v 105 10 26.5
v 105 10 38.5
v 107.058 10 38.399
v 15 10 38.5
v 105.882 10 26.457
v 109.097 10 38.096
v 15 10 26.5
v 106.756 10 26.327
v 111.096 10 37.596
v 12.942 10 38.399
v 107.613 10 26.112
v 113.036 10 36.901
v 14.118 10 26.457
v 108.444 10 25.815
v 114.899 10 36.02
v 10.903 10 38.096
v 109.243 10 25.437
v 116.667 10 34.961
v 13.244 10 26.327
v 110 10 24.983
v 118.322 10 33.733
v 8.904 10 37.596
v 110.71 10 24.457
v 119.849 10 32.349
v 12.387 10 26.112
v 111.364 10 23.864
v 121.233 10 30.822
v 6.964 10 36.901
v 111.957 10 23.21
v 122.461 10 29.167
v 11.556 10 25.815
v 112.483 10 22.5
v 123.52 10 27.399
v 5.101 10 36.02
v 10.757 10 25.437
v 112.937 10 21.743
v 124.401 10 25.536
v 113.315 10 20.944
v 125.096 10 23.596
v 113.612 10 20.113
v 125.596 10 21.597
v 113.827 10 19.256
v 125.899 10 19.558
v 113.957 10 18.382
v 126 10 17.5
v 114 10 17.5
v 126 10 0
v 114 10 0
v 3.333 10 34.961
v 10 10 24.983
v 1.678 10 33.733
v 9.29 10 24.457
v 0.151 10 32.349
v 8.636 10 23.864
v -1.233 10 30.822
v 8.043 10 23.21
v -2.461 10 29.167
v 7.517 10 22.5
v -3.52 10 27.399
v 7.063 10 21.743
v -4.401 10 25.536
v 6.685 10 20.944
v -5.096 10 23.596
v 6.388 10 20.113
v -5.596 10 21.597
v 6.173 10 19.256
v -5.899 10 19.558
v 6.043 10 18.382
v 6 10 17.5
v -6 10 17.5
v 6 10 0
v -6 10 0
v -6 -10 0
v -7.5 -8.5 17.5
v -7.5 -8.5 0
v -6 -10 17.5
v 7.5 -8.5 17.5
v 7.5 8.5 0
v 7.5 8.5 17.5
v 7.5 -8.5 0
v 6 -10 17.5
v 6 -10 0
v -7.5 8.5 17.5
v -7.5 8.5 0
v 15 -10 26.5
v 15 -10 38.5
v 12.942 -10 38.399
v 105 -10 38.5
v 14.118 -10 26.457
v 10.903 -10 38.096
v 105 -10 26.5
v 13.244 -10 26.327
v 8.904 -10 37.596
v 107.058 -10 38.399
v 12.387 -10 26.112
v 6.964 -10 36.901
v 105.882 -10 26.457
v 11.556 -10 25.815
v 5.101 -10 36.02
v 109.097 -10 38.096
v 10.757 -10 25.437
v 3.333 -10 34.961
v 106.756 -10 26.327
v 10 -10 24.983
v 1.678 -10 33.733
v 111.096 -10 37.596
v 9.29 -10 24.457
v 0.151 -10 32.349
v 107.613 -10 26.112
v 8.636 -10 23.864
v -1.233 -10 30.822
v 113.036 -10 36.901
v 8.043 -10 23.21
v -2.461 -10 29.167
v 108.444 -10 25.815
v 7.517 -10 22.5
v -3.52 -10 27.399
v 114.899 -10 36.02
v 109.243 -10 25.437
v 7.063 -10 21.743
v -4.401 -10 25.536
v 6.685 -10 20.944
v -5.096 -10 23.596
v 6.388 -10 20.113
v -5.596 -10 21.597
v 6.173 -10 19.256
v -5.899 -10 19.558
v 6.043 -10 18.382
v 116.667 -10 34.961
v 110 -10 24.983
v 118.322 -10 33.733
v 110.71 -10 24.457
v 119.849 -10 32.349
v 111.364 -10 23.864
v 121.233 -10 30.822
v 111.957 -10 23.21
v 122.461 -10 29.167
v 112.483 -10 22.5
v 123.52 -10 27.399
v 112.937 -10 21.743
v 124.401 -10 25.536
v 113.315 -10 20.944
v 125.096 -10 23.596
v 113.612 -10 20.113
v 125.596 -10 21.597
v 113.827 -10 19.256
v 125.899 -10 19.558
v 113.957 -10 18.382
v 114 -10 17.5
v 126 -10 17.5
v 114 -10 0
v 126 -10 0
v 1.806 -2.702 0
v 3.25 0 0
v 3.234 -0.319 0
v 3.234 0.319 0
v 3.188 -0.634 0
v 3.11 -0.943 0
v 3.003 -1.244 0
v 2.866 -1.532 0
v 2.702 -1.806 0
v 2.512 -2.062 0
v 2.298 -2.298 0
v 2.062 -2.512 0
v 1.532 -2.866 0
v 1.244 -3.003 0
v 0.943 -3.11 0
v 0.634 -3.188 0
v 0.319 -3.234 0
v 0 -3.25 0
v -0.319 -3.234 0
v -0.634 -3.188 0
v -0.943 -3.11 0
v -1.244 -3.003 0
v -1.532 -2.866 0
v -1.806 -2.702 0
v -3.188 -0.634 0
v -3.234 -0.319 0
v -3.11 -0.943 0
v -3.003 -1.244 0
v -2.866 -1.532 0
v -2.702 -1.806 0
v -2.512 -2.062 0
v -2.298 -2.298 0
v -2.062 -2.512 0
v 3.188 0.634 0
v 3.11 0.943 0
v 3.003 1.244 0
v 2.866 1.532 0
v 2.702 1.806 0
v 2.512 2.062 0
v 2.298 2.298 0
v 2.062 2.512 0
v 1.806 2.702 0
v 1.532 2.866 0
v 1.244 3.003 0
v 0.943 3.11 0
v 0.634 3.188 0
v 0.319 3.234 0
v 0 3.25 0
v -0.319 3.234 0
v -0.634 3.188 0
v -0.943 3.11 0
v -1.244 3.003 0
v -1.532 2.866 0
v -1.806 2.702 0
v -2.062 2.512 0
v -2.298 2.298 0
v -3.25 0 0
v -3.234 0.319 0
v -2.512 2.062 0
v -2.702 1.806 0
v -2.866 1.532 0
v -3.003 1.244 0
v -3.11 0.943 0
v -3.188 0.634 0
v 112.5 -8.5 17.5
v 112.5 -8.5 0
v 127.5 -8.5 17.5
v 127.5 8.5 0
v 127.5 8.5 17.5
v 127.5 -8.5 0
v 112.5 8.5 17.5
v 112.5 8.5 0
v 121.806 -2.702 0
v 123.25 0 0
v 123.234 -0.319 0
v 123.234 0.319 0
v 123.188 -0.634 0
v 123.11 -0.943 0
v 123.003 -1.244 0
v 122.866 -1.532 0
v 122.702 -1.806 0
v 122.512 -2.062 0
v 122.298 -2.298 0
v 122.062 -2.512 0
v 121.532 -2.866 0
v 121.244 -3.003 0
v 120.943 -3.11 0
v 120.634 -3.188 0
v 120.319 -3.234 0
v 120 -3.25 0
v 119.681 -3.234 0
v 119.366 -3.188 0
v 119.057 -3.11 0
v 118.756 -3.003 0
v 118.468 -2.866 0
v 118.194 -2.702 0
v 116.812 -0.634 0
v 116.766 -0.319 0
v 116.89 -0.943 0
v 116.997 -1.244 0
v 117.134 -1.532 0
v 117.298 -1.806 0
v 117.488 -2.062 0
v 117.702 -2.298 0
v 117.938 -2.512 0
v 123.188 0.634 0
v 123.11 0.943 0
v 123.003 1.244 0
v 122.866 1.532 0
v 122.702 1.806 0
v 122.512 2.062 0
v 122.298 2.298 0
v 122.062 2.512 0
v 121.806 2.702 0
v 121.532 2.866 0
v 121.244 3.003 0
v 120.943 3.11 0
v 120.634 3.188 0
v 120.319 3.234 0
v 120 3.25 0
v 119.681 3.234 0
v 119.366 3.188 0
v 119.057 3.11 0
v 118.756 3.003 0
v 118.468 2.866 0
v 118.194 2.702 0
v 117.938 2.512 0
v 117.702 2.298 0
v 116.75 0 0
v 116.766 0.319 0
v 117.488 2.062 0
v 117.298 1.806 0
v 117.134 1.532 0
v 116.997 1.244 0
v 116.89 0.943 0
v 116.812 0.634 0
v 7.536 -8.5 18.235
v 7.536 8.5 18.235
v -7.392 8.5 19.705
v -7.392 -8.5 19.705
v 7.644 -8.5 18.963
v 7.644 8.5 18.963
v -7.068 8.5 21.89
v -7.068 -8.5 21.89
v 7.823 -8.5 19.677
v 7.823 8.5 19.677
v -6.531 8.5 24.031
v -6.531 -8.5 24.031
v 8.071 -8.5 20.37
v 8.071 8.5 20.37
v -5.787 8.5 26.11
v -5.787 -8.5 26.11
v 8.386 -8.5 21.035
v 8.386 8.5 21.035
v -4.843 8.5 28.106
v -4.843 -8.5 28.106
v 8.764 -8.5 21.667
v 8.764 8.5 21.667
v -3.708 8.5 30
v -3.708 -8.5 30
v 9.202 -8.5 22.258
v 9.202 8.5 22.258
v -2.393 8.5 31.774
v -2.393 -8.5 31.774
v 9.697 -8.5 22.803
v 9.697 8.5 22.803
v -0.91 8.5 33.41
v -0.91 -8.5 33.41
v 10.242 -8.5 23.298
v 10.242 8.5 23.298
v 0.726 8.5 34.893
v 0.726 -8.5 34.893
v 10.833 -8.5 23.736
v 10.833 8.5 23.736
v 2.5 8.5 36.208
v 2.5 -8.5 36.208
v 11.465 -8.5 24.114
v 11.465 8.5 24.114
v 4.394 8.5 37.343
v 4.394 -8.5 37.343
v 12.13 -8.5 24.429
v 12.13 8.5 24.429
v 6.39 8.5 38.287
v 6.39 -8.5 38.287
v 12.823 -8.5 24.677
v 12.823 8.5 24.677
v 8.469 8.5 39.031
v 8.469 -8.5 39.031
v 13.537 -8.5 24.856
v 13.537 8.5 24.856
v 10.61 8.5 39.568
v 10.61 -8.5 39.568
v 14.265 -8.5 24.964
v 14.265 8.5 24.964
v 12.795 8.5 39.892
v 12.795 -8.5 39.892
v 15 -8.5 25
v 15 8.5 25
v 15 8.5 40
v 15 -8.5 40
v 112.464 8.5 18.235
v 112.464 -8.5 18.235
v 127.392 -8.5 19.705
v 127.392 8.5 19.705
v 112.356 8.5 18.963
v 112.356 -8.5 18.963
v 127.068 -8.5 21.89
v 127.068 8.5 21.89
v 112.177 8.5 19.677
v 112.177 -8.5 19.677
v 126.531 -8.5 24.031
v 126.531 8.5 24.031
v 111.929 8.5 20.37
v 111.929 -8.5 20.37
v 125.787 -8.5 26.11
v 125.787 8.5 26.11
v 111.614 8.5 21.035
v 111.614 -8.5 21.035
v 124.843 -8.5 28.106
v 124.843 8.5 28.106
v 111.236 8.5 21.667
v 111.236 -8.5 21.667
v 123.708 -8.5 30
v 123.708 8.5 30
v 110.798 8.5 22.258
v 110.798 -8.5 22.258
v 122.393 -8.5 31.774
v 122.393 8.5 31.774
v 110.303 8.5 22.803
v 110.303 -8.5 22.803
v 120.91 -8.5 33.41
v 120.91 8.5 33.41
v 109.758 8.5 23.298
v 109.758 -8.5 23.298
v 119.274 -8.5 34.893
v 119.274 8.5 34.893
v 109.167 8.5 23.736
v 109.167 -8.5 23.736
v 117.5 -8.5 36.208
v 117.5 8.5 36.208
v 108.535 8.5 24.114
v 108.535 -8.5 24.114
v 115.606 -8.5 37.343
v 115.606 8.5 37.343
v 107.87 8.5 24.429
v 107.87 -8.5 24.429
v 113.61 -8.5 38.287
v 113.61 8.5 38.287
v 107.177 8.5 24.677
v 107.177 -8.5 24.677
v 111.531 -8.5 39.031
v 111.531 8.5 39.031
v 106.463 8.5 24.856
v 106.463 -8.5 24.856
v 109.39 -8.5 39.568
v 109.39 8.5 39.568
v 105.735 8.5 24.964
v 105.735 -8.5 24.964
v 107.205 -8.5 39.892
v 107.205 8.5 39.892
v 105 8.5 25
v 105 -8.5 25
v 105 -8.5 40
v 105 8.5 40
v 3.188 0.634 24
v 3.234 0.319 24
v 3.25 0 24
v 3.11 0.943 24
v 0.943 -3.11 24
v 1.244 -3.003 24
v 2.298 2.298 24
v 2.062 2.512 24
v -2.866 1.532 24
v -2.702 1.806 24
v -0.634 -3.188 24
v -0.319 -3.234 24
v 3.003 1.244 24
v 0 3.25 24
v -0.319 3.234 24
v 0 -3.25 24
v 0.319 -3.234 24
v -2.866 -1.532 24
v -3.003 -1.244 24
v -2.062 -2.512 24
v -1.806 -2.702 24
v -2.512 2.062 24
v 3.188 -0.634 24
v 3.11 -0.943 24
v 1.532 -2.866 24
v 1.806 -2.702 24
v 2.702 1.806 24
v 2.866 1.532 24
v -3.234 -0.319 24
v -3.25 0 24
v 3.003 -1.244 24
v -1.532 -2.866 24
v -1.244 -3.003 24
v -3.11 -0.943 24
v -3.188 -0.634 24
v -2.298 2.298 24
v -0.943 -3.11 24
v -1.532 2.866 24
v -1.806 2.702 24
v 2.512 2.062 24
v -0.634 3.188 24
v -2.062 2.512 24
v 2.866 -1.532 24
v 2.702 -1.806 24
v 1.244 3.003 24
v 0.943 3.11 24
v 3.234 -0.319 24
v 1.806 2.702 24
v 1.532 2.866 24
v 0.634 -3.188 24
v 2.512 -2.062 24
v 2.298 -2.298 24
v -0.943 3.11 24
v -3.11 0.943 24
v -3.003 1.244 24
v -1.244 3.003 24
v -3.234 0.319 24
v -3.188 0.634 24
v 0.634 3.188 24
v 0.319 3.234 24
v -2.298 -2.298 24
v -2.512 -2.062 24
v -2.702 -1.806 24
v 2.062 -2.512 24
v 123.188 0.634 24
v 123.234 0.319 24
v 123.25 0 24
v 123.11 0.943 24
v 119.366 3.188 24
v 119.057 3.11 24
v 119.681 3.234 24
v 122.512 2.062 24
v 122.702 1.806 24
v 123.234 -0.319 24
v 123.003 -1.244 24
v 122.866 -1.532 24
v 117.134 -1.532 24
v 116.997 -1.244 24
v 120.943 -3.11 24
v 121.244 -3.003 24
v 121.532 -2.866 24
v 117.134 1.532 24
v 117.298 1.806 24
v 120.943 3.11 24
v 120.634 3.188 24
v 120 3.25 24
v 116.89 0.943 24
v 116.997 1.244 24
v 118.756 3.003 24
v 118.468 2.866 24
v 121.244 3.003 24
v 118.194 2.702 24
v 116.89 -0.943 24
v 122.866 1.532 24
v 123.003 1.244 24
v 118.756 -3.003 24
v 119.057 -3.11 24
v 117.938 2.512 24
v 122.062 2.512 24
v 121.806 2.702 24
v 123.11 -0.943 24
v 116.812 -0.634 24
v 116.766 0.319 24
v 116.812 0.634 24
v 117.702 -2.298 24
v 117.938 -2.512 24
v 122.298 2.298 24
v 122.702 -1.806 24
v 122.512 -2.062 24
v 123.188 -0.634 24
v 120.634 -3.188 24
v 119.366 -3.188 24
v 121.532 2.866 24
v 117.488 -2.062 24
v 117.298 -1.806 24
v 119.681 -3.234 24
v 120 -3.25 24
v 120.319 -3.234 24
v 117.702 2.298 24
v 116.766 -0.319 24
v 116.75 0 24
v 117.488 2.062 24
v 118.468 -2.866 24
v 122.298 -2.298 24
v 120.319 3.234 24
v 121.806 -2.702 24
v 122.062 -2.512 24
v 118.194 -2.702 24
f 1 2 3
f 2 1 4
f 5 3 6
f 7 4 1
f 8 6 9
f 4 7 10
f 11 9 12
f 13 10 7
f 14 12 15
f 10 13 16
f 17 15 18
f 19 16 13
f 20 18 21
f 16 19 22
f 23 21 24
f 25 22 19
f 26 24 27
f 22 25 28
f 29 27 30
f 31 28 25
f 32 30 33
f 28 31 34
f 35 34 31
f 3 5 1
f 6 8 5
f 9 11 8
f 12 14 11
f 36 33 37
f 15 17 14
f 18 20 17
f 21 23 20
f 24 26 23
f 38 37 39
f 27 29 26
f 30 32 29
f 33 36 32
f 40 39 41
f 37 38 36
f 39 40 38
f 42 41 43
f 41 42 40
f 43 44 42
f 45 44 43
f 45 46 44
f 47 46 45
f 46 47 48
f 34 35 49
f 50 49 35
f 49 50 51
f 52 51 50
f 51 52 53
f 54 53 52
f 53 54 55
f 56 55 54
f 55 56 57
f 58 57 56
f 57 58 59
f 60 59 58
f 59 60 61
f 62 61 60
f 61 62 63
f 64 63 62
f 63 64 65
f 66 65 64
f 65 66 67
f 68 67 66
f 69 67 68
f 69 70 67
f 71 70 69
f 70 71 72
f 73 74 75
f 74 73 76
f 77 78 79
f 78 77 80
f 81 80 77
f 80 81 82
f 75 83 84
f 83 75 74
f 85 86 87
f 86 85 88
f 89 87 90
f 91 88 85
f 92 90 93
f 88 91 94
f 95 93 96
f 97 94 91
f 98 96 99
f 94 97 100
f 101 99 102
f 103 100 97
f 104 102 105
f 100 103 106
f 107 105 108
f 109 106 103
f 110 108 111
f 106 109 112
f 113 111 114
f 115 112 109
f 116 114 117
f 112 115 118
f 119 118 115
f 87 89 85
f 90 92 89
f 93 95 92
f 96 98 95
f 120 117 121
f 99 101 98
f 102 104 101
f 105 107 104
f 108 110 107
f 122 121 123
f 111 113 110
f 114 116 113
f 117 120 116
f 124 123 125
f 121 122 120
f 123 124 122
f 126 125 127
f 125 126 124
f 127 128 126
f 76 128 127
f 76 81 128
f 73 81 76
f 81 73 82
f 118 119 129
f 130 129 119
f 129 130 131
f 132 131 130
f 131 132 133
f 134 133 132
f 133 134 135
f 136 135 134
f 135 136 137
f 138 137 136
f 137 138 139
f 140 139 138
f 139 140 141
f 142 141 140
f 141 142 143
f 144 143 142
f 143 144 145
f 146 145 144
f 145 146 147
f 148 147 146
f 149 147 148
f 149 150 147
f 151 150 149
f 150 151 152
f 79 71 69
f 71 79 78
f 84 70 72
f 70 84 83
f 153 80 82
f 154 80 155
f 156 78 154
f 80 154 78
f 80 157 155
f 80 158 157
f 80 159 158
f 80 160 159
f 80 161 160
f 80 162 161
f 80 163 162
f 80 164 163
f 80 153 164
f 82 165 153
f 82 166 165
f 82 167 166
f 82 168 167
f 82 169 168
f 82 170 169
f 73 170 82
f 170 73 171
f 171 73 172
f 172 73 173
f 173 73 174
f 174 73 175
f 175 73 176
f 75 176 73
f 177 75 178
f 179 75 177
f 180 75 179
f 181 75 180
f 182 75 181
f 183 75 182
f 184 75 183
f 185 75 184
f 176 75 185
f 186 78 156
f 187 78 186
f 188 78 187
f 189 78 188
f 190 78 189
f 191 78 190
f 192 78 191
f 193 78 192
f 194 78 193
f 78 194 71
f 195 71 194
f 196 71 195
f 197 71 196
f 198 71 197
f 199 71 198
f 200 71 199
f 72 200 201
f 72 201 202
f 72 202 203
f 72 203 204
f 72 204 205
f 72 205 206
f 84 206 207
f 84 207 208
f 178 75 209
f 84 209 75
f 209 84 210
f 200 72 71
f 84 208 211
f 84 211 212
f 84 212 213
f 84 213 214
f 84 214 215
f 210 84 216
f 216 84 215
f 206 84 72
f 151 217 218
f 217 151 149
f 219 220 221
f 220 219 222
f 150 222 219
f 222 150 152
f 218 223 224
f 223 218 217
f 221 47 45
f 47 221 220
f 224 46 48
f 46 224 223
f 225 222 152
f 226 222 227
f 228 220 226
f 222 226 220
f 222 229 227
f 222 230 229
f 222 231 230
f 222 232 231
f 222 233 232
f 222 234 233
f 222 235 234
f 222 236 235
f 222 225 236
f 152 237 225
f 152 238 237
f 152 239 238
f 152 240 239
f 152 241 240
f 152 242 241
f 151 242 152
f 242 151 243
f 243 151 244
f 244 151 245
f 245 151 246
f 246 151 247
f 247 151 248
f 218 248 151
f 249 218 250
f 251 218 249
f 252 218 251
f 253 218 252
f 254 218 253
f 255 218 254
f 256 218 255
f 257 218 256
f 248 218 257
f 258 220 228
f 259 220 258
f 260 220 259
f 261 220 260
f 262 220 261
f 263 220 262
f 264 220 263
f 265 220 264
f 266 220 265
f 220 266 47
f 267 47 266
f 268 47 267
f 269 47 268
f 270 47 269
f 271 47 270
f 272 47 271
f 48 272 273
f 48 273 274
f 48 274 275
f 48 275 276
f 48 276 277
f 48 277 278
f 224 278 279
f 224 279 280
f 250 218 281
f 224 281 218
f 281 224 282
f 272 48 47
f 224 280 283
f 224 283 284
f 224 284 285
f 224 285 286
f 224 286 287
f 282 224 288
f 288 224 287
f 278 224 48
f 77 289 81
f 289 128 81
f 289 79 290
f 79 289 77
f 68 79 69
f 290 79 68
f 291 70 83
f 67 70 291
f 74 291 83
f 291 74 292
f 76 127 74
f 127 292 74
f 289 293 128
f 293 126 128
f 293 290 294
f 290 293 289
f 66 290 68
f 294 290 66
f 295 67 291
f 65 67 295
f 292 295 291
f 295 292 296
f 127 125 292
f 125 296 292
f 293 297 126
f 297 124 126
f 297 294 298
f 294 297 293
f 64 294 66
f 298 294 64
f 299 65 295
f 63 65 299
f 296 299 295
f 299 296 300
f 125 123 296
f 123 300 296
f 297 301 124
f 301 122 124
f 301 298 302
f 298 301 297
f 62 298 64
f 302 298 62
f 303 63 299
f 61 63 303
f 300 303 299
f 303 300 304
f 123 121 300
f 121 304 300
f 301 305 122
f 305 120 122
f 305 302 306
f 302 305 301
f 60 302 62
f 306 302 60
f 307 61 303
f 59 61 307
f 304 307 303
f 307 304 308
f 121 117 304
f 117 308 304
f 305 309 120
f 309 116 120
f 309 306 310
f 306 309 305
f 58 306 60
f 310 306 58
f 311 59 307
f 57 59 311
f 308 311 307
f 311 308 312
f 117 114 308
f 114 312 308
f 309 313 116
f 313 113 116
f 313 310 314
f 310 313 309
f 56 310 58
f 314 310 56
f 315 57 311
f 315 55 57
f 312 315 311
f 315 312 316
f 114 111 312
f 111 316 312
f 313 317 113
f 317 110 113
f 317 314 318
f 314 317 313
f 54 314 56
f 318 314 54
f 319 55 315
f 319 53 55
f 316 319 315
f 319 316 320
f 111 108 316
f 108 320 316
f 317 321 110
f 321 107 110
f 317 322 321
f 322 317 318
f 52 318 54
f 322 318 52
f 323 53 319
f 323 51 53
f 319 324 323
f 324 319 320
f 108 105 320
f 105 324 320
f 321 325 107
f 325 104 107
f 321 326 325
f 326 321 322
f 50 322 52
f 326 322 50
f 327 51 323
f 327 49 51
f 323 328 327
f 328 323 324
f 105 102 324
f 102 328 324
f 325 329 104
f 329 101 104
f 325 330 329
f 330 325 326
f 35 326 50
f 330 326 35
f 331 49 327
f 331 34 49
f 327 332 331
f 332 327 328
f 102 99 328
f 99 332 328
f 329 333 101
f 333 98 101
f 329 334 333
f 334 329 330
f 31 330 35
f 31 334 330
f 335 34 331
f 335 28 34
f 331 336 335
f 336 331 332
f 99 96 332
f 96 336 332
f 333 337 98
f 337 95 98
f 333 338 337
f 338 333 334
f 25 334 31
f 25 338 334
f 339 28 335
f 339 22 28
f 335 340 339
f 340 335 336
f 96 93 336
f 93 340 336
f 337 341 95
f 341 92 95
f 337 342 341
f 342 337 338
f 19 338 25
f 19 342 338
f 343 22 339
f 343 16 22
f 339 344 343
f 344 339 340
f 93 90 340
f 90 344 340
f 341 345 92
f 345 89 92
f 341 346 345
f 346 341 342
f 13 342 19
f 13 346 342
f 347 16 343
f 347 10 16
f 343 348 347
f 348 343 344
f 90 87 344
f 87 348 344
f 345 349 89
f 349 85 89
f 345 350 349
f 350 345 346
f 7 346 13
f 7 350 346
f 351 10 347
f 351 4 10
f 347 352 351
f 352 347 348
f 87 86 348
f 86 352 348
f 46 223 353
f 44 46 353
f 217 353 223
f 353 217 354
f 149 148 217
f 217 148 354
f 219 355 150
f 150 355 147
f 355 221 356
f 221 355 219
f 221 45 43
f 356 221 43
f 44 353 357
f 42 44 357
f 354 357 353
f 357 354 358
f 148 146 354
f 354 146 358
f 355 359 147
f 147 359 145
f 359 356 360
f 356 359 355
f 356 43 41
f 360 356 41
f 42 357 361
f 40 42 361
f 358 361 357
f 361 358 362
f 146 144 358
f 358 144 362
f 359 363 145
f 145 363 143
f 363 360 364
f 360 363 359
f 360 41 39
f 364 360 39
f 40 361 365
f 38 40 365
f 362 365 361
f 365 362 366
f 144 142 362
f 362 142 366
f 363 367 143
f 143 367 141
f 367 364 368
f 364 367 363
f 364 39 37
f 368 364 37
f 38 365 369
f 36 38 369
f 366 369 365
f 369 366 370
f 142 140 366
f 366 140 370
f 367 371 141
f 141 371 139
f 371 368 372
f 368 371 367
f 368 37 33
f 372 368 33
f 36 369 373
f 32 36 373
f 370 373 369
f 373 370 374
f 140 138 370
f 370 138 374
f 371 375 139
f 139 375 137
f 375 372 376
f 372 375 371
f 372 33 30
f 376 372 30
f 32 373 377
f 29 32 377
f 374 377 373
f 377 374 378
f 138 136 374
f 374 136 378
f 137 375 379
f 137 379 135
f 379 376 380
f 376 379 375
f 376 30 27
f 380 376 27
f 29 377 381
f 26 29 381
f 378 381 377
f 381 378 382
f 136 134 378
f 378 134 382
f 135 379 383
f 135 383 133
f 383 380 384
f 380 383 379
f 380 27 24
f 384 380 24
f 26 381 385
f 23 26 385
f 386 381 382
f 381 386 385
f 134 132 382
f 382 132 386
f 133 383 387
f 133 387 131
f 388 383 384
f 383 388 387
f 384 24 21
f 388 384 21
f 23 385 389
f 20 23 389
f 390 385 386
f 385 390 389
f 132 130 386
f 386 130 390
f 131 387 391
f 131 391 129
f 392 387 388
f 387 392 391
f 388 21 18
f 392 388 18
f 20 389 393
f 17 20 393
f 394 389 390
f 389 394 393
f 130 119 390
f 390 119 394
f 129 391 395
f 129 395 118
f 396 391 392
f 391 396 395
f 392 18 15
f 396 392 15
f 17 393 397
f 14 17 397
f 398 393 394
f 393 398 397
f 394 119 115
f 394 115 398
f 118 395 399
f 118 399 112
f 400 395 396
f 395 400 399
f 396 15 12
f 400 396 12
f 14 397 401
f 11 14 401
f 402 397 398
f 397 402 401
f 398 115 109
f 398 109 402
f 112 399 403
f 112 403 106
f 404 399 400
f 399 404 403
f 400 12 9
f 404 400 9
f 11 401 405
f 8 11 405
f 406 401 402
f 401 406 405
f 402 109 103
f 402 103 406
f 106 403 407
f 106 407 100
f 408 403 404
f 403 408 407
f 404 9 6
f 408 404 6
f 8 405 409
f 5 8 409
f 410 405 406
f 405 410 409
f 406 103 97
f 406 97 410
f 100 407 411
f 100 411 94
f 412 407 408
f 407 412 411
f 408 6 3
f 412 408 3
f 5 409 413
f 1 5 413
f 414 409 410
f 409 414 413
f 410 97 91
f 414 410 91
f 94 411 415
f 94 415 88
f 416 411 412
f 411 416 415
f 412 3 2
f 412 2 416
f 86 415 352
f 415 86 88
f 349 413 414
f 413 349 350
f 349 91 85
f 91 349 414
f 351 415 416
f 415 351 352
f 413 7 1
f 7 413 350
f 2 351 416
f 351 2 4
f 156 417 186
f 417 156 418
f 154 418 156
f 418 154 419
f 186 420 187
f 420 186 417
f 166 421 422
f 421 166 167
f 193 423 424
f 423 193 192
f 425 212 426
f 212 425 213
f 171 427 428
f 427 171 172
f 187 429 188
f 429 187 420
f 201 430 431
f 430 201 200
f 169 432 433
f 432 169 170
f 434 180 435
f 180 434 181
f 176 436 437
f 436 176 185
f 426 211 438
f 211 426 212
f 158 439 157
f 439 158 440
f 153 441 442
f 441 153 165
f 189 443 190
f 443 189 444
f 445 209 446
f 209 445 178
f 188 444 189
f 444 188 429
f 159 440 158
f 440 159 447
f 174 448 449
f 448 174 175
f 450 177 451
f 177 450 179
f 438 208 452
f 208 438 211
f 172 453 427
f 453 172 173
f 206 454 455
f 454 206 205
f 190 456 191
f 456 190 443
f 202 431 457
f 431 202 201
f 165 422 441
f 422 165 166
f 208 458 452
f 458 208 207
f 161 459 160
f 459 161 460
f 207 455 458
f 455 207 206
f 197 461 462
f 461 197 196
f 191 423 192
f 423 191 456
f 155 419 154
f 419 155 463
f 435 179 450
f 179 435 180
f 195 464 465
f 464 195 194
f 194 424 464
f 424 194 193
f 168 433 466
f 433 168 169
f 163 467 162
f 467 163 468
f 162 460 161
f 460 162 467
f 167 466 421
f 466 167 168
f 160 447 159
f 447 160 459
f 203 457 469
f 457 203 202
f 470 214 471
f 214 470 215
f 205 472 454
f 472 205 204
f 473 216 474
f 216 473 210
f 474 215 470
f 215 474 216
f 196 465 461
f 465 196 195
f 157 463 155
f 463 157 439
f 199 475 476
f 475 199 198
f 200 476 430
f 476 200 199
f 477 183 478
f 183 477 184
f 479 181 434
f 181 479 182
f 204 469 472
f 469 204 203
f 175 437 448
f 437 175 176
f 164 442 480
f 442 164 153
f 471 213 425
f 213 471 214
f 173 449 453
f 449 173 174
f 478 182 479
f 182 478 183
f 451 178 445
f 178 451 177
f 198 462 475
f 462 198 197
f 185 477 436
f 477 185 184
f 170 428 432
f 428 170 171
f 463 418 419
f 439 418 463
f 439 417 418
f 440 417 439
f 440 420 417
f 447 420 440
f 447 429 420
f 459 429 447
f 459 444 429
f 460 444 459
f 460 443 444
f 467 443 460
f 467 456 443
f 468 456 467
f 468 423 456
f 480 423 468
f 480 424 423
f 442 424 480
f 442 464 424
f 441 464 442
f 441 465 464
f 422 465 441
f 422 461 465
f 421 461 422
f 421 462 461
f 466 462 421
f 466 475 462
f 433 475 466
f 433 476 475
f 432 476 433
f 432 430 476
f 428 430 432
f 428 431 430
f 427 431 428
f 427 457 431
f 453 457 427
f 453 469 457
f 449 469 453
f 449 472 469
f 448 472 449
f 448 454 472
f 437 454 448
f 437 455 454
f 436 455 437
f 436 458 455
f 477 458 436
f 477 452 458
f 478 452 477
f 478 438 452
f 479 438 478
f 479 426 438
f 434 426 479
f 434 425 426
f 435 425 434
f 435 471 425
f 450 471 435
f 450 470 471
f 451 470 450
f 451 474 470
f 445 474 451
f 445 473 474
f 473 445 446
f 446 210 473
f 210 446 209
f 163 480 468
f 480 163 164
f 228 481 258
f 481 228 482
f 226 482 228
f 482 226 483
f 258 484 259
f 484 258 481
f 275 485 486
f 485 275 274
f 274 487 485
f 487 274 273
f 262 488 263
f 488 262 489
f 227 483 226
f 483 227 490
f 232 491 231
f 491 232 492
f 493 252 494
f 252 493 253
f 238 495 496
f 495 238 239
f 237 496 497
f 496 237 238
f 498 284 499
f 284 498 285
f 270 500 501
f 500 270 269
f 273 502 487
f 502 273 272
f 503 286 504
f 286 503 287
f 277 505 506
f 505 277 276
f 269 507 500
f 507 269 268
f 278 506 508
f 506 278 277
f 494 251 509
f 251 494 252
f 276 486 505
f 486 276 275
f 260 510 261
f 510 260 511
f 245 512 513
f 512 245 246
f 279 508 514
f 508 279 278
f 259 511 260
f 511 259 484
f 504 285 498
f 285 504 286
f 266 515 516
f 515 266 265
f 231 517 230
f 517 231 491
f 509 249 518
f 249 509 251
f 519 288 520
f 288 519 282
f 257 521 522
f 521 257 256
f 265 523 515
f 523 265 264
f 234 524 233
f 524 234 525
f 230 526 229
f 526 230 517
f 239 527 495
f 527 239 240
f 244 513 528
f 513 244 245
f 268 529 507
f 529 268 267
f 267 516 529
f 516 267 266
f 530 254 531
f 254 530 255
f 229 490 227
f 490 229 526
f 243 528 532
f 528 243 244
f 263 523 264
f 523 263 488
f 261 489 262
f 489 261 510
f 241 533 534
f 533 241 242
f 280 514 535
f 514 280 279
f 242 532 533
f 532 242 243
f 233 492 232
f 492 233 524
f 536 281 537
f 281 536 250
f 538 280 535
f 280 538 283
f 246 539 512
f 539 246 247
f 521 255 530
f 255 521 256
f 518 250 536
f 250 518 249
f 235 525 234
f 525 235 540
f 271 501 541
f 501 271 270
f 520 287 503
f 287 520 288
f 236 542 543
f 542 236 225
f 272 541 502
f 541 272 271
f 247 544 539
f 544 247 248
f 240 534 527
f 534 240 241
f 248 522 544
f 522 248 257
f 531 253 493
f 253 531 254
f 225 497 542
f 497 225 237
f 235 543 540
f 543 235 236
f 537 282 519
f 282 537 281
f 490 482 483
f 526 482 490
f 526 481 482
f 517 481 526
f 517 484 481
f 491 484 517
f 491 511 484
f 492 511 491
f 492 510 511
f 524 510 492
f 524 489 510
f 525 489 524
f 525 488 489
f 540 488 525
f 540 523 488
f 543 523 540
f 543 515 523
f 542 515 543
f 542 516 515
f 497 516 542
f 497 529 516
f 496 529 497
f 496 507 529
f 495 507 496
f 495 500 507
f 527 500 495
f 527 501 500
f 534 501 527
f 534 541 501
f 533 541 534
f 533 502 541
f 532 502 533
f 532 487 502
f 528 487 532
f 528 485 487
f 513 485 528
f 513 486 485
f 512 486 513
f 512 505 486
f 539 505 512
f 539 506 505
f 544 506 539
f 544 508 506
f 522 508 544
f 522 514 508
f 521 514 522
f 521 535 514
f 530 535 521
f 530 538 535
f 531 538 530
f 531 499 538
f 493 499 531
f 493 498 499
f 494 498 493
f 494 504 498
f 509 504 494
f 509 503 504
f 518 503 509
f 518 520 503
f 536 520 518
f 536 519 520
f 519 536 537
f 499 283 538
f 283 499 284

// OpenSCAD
/* [Parameters] */

// Determines the distance between the two screw holes.
Length = 120;

// Determines the size of the 45-degree chamfer on the edges.
Chamfer_size = 1.5; 

// Determines the passthrough hole diameter for the two screws.
Skrew_diameter = 6.5;

// Determines handle width
Width = 20;

// Determines handle height / finger clearance.
Finger_clearance = 25;

// Determines thickness of handle.
Thickness = 15;

// Determines Bend Radius
Bend_Radius = 0;

/* [Hidden] */
$fn = 64; // Smoothness resolution for curves

// --- 2D Cross Section Profile ---
// This generates a 2D rectangle with 45-degree chamfered corners
module chamfered_profile(t, w, c) {
    polygon([
        [-t/2, -w/2 + c],
        [-t/2 + c, -w/2],
        [t/2 - c, -w/2],
        [t/2, -w/2 + c],
        [t/2, w/2 - c],
        [t/2 - c, w/2],
        [-t/2 + c, w/2],
        [-t/2, w/2 - c]
    ]);
}

module Parametric_Handle() {
    
    // Auto-calculate bend alignments
    Bend_Radius = Thickness  + Bend_Radius; 
    C_Z = Finger_clearance - (Thickness / 2); 

    // We generate the model standing up on its legs
    difference() {
        
        // --- 1. Main Solid Body ---
        union() {
            // A. Left Leg (Extruded straight up)
            translate([0, 0, 0])
                linear_extrude(height = C_Z)
                    chamfered_profile(Thickness, Width, Chamfer_size);

            // B. Right Leg (Extruded straight up)
            translate([Length, 0, 0])
                linear_extrude(height = C_Z)
                    chamfered_profile(Thickness, Width, Chamfer_size);

            // C. Left Top Corner (Rotated and swept 90 degrees)
            translate([Bend_Radius, 0, C_Z])
                rotate([90, 0, 180])
                    rotate_extrude(angle = 90)
                        translate([Bend_Radius, 0, 0])
                            chamfered_profile(Thickness, Width, Chamfer_size);

            // D. Right Top Corner (Rotated and swept 90 degrees)
            translate([Length - Bend_Radius, 0, C_Z])
                rotate([90, 0, 0])
                    rotate_extrude(angle = 90)
                        translate([Bend_Radius, 0, 0])
                            chamfered_profile(Thickness, Width, Chamfer_size);

            // E. Top Horizontal Bar
            translate([Bend_Radius, 0, C_Z + Bend_Radius])
                rotate([0, 90, 0])
                    linear_extrude(height = Length - 2 * Bend_Radius)
                        chamfered_profile(Thickness, Width, Chamfer_size);
        }

        // --- 2. Screw Holes ---
        // Left hole going up into the leg
        translate([0, 0, -1])
            cylinder(d = Skrew_diameter, h = Thickness + 10);

        // Right hole going up into the leg
        translate([Length, 0, -1])
            cylinder(d = Skrew_diameter, h = Thickness + 10);
    }
}

// Generate the model
// Note: If you want to lay it flat for 3D printing, 
// wrap this function in: rotate([90, 0, 0]) Parametric_Handle();
Parametric_Handle();
